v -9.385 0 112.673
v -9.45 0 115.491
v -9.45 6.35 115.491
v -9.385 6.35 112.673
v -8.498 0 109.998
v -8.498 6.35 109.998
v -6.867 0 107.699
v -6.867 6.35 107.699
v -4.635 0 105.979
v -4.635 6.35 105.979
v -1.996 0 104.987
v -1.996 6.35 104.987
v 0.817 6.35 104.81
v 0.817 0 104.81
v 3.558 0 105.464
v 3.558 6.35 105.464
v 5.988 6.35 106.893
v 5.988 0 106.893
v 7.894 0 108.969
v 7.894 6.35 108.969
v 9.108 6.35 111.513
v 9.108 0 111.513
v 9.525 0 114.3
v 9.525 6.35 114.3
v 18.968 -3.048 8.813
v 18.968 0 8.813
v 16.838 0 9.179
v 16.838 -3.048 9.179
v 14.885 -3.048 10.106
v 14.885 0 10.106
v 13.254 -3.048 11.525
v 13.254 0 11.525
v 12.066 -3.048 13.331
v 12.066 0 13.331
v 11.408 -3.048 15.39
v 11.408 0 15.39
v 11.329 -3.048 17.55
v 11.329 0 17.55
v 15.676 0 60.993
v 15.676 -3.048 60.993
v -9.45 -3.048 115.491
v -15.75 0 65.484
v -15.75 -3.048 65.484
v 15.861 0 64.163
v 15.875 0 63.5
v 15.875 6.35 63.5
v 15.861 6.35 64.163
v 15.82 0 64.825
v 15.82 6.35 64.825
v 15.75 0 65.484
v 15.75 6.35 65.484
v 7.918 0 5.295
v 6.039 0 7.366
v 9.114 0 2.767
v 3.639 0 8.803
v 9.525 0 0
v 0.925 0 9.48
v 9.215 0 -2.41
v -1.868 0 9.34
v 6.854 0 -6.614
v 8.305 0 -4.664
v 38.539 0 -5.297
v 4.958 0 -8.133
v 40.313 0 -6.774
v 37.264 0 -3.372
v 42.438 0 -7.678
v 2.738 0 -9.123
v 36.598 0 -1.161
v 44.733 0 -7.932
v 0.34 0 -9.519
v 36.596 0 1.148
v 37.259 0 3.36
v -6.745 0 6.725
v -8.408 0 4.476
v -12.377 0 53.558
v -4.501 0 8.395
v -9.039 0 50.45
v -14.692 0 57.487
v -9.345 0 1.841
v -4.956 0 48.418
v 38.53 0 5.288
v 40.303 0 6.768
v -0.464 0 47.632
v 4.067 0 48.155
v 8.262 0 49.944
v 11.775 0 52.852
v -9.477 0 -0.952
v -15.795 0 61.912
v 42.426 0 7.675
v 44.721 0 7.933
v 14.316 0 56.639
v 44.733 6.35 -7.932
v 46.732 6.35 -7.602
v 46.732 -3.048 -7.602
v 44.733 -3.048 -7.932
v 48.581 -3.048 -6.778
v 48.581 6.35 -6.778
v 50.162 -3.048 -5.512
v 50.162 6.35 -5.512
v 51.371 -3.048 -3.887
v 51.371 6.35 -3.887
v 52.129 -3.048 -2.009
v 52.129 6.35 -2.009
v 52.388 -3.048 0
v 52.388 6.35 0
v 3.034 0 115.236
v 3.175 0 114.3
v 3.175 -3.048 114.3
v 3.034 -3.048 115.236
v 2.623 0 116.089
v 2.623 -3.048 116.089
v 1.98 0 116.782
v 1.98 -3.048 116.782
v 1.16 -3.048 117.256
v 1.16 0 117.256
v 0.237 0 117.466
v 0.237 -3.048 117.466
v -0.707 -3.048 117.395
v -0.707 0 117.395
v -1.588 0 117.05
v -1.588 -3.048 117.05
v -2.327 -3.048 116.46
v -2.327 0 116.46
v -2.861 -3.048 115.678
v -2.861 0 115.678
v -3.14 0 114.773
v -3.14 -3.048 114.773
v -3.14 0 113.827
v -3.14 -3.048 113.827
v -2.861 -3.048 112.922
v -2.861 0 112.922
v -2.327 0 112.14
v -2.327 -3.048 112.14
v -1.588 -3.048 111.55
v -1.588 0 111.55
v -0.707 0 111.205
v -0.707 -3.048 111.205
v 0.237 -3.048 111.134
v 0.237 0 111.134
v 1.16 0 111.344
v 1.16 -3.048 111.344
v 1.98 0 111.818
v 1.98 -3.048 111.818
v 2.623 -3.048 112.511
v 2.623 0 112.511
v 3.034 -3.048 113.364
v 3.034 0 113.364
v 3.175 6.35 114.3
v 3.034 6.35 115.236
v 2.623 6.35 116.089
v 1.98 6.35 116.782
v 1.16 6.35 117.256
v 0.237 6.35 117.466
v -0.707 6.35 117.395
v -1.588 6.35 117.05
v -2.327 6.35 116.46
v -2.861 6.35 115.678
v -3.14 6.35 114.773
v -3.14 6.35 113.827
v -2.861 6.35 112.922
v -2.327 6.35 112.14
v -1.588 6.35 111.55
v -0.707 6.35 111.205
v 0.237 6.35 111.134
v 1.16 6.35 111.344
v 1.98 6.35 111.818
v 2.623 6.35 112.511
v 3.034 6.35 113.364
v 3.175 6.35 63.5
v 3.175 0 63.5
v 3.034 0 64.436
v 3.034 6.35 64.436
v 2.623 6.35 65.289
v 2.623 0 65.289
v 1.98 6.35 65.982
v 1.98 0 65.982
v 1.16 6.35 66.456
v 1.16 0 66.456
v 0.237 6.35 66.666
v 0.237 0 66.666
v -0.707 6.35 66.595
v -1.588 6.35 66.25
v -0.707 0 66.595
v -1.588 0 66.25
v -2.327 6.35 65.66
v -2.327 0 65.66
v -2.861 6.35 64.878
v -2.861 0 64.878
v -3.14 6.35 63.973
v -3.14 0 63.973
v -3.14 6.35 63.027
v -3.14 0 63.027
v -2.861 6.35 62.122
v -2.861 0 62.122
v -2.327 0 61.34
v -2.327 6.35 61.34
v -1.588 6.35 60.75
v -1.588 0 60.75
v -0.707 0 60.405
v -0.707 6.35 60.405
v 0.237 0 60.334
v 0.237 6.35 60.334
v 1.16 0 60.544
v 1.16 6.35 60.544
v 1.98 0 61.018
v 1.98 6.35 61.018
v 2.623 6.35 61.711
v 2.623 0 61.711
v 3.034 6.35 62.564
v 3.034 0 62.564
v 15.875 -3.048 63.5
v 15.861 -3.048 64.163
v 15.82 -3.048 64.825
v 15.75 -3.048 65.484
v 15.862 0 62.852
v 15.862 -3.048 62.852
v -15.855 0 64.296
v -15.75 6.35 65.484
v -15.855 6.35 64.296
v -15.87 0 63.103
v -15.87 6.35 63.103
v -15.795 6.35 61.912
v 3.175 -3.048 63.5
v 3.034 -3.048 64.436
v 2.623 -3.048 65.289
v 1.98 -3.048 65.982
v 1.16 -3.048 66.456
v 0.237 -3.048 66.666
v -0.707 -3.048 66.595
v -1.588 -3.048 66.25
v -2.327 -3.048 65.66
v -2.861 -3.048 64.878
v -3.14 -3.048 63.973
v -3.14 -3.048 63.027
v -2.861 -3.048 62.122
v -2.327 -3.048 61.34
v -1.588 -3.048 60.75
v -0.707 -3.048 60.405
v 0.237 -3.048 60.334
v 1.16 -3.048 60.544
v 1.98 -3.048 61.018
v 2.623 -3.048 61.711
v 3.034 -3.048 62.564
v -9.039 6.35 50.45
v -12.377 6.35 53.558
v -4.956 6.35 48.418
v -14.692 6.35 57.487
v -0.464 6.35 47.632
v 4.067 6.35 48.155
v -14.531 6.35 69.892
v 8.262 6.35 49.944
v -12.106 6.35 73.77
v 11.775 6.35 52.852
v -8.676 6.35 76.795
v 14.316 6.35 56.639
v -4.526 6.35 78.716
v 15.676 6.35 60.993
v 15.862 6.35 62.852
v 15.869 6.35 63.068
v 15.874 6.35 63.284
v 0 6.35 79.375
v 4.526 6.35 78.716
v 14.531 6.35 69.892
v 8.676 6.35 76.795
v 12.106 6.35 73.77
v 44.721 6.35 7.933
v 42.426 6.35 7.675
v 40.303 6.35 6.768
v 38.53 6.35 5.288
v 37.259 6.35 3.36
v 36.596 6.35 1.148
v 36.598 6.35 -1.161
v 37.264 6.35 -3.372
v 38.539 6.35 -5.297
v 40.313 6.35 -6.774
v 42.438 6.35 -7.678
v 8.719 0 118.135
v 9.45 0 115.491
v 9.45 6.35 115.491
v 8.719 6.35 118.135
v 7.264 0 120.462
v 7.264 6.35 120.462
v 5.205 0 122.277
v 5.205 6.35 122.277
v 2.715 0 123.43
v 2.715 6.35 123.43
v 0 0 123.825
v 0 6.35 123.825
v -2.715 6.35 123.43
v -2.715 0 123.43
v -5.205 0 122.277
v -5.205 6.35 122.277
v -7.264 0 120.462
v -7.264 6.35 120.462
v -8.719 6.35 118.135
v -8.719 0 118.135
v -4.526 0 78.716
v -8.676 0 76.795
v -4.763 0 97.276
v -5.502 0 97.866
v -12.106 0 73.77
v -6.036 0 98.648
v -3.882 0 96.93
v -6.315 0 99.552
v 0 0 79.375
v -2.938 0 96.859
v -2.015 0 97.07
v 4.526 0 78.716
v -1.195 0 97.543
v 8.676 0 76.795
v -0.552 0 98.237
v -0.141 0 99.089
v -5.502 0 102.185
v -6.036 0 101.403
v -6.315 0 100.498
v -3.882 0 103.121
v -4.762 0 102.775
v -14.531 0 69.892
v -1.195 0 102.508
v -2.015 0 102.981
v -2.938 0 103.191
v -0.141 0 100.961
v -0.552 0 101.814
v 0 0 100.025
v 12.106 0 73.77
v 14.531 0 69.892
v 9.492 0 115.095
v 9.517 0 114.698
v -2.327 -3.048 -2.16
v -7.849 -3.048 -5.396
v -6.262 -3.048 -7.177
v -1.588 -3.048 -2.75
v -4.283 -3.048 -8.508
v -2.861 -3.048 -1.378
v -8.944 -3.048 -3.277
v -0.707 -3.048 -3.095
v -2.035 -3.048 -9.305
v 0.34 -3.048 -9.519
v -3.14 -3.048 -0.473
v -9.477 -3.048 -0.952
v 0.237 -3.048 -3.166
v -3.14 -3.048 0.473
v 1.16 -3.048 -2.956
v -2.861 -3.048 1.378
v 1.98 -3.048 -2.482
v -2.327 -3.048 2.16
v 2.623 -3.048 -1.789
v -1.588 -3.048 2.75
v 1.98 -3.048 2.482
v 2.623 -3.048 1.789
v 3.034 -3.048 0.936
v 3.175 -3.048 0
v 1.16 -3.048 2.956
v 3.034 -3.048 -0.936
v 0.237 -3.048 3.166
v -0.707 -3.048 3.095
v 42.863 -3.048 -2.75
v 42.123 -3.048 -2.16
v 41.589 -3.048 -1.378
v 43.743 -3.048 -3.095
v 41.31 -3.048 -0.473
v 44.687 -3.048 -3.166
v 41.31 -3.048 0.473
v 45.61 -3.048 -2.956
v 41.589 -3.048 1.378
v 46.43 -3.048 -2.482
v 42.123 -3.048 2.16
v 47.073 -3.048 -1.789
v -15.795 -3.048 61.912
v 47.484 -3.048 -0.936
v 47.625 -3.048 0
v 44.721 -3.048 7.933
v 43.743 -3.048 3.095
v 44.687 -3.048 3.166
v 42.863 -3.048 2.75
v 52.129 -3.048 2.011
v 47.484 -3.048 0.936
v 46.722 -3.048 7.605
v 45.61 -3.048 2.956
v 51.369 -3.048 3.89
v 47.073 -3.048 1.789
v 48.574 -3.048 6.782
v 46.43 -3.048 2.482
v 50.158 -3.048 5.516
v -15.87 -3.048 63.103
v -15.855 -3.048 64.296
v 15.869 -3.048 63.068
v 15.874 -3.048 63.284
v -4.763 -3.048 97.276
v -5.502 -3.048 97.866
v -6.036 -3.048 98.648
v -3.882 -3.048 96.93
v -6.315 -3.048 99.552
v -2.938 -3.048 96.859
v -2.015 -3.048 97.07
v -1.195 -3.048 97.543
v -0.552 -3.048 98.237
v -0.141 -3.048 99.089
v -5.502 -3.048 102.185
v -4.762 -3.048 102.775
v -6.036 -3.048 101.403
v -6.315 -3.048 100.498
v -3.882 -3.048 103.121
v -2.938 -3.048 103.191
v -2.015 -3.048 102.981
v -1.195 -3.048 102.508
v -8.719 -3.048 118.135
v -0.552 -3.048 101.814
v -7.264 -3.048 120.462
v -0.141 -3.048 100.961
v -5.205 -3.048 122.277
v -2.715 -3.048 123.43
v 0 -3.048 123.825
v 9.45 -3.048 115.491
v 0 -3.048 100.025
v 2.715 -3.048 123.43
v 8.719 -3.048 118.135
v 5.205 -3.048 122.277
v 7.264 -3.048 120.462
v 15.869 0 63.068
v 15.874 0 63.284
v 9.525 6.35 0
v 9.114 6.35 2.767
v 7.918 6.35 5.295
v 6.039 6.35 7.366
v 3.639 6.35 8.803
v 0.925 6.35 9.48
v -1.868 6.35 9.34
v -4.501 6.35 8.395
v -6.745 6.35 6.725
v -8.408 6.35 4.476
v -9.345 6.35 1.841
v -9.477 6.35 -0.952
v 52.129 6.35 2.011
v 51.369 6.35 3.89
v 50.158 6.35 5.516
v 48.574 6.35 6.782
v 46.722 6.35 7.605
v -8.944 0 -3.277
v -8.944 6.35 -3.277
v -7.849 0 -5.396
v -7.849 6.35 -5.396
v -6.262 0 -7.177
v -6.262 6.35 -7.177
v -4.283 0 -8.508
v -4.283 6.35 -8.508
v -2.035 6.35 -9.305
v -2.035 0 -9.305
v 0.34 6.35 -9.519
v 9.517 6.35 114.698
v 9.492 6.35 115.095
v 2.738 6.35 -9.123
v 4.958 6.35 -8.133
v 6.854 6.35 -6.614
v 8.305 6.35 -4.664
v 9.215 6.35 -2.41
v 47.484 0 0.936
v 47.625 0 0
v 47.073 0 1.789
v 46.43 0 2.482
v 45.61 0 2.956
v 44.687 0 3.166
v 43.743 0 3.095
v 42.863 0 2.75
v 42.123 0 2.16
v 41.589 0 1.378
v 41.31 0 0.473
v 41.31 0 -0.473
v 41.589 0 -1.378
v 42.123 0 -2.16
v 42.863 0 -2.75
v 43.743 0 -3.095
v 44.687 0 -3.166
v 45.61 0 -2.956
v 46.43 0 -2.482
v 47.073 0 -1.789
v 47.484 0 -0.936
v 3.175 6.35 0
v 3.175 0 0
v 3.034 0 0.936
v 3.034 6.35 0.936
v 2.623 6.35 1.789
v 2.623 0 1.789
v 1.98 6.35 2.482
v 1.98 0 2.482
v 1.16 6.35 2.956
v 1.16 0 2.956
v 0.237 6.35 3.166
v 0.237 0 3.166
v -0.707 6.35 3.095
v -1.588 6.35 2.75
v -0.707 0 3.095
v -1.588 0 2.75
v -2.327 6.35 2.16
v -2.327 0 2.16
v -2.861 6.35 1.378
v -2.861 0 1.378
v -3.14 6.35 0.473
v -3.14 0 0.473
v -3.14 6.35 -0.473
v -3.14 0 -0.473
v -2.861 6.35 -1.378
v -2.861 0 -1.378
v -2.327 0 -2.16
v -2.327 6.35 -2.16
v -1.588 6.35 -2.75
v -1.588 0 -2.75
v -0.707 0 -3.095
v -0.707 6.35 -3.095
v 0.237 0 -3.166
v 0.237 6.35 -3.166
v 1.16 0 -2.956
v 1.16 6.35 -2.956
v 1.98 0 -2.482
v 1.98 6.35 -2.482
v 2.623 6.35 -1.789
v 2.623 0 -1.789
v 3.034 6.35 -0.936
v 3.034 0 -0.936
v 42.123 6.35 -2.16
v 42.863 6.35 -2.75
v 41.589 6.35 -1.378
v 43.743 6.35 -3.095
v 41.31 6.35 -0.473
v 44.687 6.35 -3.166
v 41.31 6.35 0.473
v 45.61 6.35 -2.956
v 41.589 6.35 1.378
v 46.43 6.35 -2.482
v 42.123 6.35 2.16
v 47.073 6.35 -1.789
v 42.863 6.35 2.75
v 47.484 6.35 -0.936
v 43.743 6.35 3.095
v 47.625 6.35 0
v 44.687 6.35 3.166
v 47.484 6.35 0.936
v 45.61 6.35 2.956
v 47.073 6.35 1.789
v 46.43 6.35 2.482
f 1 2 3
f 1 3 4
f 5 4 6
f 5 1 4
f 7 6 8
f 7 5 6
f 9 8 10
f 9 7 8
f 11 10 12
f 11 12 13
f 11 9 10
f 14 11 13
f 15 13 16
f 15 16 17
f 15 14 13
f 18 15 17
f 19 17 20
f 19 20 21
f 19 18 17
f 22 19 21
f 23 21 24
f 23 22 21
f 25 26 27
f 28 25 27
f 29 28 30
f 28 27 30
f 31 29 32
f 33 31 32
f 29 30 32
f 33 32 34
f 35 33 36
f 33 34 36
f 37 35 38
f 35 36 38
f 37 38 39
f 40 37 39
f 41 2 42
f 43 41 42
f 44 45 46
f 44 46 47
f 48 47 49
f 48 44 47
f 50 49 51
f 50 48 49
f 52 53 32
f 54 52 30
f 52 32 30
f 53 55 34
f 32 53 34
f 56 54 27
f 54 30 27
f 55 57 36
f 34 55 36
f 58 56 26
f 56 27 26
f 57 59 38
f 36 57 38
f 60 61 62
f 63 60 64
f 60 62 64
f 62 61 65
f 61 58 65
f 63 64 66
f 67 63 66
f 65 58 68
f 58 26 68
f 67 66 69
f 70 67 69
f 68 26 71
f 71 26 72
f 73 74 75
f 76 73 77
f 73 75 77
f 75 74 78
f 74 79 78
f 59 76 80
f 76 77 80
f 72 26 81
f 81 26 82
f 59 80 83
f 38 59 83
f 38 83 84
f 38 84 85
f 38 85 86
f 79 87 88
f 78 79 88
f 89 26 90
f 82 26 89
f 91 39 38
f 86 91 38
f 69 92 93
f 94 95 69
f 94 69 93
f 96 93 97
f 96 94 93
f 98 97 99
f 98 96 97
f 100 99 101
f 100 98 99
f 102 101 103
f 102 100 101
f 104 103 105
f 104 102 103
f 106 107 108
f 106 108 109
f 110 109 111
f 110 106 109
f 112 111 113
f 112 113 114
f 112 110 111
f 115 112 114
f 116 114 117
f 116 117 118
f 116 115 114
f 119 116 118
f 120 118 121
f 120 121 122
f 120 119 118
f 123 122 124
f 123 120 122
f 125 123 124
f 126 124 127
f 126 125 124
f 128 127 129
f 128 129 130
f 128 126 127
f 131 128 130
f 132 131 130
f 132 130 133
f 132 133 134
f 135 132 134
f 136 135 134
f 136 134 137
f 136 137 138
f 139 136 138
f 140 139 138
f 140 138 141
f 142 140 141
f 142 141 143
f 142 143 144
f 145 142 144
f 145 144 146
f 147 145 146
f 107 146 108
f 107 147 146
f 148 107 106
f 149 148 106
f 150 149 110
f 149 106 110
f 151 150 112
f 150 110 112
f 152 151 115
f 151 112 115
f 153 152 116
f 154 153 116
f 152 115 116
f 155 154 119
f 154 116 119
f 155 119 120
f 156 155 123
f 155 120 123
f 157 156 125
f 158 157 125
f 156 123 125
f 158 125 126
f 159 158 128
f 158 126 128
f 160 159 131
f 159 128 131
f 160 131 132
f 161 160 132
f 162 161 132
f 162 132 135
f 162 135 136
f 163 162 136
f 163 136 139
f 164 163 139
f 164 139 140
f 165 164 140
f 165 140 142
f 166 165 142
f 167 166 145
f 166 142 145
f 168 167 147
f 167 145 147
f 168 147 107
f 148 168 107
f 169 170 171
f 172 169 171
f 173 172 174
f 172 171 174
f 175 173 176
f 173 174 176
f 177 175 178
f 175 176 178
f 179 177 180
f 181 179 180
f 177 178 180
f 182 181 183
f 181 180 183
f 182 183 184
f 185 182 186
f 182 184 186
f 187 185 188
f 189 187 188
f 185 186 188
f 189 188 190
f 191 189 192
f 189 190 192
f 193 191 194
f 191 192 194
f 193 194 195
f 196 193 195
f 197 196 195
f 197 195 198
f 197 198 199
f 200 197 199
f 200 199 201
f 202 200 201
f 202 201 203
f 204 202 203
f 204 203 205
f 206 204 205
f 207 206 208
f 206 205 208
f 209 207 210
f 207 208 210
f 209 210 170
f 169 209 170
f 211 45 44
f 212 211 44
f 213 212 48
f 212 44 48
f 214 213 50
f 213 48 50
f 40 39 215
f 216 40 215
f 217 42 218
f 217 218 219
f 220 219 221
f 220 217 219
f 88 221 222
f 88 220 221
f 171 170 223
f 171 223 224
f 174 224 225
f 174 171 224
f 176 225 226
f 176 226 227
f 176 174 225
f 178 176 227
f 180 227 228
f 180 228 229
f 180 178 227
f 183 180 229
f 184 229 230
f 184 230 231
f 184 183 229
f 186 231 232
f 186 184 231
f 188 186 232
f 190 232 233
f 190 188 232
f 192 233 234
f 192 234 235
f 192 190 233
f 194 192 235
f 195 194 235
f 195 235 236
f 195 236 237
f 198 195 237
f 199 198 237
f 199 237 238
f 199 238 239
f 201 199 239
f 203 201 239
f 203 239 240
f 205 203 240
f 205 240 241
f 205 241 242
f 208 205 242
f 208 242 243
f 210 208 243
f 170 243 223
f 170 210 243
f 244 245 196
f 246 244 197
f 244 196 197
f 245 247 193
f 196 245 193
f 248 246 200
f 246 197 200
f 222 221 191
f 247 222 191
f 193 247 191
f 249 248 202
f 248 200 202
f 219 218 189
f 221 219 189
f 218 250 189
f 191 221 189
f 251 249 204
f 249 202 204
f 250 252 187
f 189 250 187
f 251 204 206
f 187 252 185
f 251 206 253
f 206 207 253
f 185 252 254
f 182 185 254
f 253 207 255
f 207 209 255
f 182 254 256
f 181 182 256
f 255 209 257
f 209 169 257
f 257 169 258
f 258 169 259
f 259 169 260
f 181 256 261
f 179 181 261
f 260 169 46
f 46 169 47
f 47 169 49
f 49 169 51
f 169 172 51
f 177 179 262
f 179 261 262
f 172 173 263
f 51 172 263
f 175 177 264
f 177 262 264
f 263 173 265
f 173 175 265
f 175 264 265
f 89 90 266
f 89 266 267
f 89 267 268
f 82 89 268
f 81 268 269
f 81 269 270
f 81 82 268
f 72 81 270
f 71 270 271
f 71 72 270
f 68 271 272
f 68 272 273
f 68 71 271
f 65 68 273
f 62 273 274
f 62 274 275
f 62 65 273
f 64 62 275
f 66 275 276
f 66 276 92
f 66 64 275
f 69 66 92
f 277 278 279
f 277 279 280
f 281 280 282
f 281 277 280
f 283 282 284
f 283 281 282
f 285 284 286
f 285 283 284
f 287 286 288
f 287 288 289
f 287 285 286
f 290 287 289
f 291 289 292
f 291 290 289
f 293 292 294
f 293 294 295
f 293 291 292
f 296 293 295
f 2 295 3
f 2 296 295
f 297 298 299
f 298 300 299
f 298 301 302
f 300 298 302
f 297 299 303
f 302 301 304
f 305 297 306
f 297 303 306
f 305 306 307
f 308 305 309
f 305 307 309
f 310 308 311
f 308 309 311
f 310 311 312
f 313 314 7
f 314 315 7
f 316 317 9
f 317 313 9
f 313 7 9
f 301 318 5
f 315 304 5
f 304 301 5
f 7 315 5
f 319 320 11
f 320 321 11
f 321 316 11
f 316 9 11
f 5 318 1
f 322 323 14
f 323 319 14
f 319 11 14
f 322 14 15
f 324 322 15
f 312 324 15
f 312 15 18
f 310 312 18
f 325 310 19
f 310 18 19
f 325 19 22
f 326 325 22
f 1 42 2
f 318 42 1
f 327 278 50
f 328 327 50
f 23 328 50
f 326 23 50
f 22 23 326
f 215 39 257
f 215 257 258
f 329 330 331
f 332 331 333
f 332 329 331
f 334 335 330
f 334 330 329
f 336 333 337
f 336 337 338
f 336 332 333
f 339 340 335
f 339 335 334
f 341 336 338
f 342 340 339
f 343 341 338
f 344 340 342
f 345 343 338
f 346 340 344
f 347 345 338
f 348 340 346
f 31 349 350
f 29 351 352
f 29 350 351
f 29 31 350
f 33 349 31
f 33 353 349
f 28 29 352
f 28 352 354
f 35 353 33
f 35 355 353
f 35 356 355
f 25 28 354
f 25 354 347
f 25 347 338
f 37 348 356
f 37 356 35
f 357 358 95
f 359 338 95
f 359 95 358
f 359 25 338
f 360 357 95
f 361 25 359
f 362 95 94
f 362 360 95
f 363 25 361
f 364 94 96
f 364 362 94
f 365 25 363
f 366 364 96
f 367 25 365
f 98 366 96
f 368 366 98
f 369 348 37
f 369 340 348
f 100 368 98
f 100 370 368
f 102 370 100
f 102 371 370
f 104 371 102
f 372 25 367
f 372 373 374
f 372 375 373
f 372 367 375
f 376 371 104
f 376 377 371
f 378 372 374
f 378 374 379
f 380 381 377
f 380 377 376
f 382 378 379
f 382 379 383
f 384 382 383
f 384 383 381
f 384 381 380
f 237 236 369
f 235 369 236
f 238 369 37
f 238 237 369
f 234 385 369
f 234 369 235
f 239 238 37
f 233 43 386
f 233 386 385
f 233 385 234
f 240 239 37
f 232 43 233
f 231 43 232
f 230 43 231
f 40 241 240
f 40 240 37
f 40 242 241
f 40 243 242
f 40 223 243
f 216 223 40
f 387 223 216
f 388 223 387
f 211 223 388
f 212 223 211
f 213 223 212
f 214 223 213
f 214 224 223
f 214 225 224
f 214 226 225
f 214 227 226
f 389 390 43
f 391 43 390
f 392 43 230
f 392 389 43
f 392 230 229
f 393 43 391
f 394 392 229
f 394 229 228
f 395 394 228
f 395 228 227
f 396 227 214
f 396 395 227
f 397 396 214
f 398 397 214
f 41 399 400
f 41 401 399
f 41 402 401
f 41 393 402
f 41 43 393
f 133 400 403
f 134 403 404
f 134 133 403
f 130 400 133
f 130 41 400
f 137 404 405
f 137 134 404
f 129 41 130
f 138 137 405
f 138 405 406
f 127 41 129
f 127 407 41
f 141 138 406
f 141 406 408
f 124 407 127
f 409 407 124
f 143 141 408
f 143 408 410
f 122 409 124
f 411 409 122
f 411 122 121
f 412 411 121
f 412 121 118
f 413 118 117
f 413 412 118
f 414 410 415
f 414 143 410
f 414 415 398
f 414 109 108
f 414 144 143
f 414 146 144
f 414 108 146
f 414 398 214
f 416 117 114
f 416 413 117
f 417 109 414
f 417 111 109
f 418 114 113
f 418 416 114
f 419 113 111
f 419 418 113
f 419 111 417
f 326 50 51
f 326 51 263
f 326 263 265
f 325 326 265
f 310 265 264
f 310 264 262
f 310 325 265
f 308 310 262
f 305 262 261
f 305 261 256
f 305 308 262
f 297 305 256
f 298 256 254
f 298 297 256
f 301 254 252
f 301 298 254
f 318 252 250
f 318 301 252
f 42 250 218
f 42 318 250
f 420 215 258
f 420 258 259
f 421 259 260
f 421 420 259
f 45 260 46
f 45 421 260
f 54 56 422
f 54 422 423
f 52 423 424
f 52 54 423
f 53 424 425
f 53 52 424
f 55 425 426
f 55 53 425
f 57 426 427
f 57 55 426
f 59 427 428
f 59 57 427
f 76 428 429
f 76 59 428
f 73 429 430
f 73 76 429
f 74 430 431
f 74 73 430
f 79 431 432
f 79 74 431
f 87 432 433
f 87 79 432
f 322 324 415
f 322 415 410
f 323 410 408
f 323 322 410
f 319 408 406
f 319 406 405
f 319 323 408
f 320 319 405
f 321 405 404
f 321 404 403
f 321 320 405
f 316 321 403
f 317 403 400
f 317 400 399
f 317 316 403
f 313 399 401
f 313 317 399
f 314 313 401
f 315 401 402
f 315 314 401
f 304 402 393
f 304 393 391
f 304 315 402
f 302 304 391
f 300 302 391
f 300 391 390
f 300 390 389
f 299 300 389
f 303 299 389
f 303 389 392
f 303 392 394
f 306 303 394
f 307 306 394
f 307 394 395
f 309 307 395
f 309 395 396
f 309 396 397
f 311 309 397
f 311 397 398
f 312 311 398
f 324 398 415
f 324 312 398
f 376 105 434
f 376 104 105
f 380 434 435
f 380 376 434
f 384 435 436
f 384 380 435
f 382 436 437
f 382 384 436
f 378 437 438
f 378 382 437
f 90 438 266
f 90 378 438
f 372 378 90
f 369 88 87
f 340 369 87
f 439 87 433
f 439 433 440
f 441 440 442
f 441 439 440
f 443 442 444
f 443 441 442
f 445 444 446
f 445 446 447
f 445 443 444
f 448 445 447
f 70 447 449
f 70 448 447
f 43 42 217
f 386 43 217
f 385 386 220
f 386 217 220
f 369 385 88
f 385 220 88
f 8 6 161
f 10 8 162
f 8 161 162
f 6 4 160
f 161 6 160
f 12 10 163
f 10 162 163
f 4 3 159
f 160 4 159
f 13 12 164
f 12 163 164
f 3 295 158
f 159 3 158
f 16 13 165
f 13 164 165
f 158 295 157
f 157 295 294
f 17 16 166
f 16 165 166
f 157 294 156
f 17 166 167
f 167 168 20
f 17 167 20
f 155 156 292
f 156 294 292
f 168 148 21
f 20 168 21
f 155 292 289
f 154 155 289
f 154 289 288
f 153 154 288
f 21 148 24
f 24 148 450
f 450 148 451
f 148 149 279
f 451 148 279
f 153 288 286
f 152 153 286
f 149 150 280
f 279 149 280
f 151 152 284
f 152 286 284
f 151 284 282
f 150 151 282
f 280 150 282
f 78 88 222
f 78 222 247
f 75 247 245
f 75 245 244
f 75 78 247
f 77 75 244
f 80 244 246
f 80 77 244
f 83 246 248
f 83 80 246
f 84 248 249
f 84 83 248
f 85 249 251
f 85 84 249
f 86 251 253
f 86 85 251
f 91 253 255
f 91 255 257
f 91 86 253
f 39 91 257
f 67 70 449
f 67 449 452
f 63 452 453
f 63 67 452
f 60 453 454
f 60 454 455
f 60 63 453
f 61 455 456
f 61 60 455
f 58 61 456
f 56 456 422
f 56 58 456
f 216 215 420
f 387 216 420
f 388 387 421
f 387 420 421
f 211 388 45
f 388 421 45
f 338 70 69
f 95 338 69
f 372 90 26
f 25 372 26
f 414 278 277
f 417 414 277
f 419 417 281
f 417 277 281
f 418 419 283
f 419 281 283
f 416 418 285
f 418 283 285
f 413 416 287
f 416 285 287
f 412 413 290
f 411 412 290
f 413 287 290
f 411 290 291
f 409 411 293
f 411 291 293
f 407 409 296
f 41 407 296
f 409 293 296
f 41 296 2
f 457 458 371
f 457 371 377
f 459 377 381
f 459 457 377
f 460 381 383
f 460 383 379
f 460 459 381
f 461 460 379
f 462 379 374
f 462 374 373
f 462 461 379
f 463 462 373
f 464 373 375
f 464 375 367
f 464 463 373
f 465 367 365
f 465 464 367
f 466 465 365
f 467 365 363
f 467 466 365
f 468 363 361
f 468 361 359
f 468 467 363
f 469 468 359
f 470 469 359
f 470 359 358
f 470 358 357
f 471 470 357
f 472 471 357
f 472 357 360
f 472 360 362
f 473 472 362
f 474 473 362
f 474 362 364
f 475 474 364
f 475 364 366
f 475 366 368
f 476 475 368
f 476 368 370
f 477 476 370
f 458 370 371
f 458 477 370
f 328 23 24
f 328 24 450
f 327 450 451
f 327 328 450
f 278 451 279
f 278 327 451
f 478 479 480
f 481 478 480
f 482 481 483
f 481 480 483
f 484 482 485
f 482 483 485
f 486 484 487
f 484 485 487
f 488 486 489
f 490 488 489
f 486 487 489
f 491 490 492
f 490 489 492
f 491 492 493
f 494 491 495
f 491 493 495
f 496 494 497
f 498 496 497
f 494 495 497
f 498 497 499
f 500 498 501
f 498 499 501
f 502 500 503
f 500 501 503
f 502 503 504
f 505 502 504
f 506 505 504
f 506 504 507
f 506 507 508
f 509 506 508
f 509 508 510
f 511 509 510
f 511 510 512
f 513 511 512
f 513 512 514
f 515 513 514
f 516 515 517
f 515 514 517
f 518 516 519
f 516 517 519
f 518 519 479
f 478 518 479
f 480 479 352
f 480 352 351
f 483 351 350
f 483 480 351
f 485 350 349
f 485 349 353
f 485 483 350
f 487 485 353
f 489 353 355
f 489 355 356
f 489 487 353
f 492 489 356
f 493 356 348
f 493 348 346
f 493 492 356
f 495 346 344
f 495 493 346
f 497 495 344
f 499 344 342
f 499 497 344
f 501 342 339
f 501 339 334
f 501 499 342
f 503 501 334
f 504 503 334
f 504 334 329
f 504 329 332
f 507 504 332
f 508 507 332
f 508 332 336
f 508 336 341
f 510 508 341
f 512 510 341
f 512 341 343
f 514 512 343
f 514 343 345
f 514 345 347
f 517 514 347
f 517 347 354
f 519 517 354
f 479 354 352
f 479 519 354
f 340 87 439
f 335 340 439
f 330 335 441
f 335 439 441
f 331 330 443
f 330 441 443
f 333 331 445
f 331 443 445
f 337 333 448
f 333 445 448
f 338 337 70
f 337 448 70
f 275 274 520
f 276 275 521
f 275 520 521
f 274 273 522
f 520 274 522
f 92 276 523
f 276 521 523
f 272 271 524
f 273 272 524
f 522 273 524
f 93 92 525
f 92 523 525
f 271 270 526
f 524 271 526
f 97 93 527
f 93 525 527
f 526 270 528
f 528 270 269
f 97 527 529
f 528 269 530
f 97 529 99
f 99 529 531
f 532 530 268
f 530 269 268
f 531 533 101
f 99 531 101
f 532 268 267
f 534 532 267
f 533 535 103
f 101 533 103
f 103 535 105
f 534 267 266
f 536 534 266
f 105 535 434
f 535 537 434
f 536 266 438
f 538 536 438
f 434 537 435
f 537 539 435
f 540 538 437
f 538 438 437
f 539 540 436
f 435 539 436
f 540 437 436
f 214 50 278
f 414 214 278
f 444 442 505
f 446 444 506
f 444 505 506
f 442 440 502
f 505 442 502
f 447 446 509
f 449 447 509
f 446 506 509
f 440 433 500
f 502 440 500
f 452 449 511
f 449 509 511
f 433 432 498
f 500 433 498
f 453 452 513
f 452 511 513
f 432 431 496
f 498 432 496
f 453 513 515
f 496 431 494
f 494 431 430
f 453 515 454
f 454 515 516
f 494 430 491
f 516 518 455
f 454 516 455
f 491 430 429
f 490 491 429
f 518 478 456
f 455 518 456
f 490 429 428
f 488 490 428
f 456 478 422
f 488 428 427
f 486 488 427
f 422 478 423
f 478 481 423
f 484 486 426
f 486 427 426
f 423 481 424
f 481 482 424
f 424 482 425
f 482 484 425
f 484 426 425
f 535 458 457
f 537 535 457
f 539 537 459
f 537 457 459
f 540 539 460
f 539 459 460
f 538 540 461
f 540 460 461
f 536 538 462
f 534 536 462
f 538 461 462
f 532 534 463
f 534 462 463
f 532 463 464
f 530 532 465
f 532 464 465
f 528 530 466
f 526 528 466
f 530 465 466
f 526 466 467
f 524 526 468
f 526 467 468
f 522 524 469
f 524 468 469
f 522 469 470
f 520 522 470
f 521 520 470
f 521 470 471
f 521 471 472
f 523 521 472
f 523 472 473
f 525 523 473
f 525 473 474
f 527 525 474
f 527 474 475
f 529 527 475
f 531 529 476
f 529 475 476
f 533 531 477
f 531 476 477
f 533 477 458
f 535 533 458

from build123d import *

# Parameters (mm, degrees)
F0_R     = 3.175
F1_DEPTH = 3.048
F2_DEPTH = 6.35


with BuildPart() as f1:
    # F0 (on Front) → F1 (new body)
    with BuildSketch(Plane.XZ):
        with BuildLine():
            Line((-9.450293, 115.490625), (-15.750488, 65.484375))
            ThreePointArc((-15.750488, 65.484375), (0, 79.375), (15.750488, 65.484375))
            Line((15.750488, 65.484375), (9.450293, 115.490625))
            ThreePointArc((9.450293, 115.490625), (9.506305, 114.896483), (9.525, 114.3))
            ThreePointArc((9.525, 114.3), (-0.596483, 104.793695), (-9.450293, 115.490625))
        make_face()
        with Locations((-3.175, 100.0252)):
            Circle(F0_R, mode=Mode.SUBTRACT)
        with BuildLine():
            ThreePointArc((-9.477255, -0.9525), (-0.476848, 9.513056), (9.525, 0))
            ThreePointArc((9.525, 0), (6.854408, -6.613827), (0.340179, -9.518923))
            Line((0.340179, -9.518923), (44.733482, -7.932436))
            ThreePointArc((44.733482, -7.932436), (36.512502, -0.006243), (44.721004, 7.932872))
            Line((44.721004, 7.932872), (18.967926, 8.812653))
            ThreePointArc((18.967926, 8.812653), (13.25428, 11.525202), (11.328669, 17.549793))
            Line((11.328669, 17.549793), (15.675725, 60.99256))
            ThreePointArc((15.675725, 60.99256), (-0.463847, 47.631778), (-15.795426, 61.9125))
            Line((-15.795426, 61.9125), (-9.477255, -0.9525))
        make_face()
        with BuildLine():
            ThreePointArc((9.450293, 115.490625), (0, 123.825), (-9.450293, 115.490625))
            ThreePointArc((-9.450293, 115.490625), (-0.596483, 104.793695), (9.525, 114.3))
            ThreePointArc((9.525, 114.3), (9.506305, 114.896483), (9.450293, 115.490625))
        make_face()
        with Locations((0, 114.3)):
            Circle(F0_R, mode=Mode.SUBTRACT)
        with BuildLine():
            ThreePointArc((-15.750488, 65.484375), (-15.873744, 63.699705), (-15.795426, 61.9125))
            ThreePointArc((-15.795426, 61.9125), (-0.463847, 47.631778), (15.675725, 60.99256))
            Line((15.675725, 60.99256), (15.861756, 62.851674))
            ThreePointArc((15.861756, 62.851674), (15.871689, 63.175769), (15.875, 63.5))
            ThreePointArc((15.875, 63.5), (15.843841, 64.494139), (15.750488, 65.484375))
            ThreePointArc((15.750488, 65.484375), (0, 79.375), (-15.750488, 65.484375))
        make_face()
        with Locations((0, 63.5)):
            Circle(F0_R, mode=Mode.SUBTRACT)
        with BuildLine():
            ThreePointArc((0.340179, -9.518923), (6.854408, -6.613827), (9.525, 0))
            ThreePointArc((9.525, 0), (-0.476848, 9.513056), (-9.477255, -0.9525))
            ThreePointArc((-9.477255, -0.9525), (-6.262383, -7.17692), (0.340179, -9.518923))
        make_face()
        Circle(F0_R, mode=Mode.SUBTRACT)
        with BuildLine():
            ThreePointArc((44.721004, 7.932872), (36.512502, -0.006243), (44.733482, -7.932436))
            ThreePointArc((44.733482, -7.932436), (50.162007, -5.511523), (52.3875, 0))
            ThreePointArc((52.3875, 0), (50.15767, 5.516014), (44.721004, 7.932872))
        make_face()
        with Locations((44.45, 0)):
            Circle(F0_R, mode=Mode.SUBTRACT)
    extrude(amount=F1_DEPTH)

    # F0 (on Front) → F2 (join)
    with BuildSketch(Plane.XZ):
        with BuildLine():
            ThreePointArc((44.721004, 7.932872), (36.512502, -0.006243), (44.733482, -7.932436))
            ThreePointArc((44.733482, -7.932436), (50.162007, -5.511523), (52.3875, 0))
            ThreePointArc((52.3875, 0), (50.15767, 5.516014), (44.721004, 7.932872))
        make_face()
        with Locations((44.45, 0)):
            Circle(F0_R, mode=Mode.SUBTRACT)
        with BuildLine():
            ThreePointArc((0.340179, -9.518923), (6.854408, -6.613827), (9.525, 0))
            ThreePointArc((9.525, 0), (-0.476848, 9.513056), (-9.477255, -0.9525))
            ThreePointArc((-9.477255, -0.9525), (-6.262383, -7.17692), (0.340179, -9.518923))
        make_face()
        Circle(F0_R, mode=Mode.SUBTRACT)
        with BuildLine():
            ThreePointArc((-15.750488, 65.484375), (-15.873744, 63.699705), (-15.795426, 61.9125))
            ThreePointArc((-15.795426, 61.9125), (-0.463847, 47.631778), (15.675725, 60.99256))
            Line((15.675725, 60.99256), (15.861756, 62.851674))
            ThreePointArc((15.861756, 62.851674), (15.871689, 63.175769), (15.875, 63.5))
            ThreePointArc((15.875, 63.5), (15.843841, 64.494139), (15.750488, 65.484375))
            ThreePointArc((15.750488, 65.484375), (0, 79.375), (-15.750488, 65.484375))
        make_face()
        with Locations((0, 63.5)):
            Circle(F0_R, mode=Mode.SUBTRACT)
        with BuildLine():
            ThreePointArc((9.450293, 115.490625), (0, 123.825), (-9.450293, 115.490625))
            ThreePointArc((-9.450293, 115.490625), (-0.596483, 104.793695), (9.525, 114.3))
            ThreePointArc((9.525, 114.3), (9.506305, 114.896483), (9.450293, 115.490625))
        make_face()
        with Locations((0, 114.3)):
            Circle(F0_R, mode=Mode.SUBTRACT)
    extrude(amount=-F2_DEPTH)


solid = f1.part
